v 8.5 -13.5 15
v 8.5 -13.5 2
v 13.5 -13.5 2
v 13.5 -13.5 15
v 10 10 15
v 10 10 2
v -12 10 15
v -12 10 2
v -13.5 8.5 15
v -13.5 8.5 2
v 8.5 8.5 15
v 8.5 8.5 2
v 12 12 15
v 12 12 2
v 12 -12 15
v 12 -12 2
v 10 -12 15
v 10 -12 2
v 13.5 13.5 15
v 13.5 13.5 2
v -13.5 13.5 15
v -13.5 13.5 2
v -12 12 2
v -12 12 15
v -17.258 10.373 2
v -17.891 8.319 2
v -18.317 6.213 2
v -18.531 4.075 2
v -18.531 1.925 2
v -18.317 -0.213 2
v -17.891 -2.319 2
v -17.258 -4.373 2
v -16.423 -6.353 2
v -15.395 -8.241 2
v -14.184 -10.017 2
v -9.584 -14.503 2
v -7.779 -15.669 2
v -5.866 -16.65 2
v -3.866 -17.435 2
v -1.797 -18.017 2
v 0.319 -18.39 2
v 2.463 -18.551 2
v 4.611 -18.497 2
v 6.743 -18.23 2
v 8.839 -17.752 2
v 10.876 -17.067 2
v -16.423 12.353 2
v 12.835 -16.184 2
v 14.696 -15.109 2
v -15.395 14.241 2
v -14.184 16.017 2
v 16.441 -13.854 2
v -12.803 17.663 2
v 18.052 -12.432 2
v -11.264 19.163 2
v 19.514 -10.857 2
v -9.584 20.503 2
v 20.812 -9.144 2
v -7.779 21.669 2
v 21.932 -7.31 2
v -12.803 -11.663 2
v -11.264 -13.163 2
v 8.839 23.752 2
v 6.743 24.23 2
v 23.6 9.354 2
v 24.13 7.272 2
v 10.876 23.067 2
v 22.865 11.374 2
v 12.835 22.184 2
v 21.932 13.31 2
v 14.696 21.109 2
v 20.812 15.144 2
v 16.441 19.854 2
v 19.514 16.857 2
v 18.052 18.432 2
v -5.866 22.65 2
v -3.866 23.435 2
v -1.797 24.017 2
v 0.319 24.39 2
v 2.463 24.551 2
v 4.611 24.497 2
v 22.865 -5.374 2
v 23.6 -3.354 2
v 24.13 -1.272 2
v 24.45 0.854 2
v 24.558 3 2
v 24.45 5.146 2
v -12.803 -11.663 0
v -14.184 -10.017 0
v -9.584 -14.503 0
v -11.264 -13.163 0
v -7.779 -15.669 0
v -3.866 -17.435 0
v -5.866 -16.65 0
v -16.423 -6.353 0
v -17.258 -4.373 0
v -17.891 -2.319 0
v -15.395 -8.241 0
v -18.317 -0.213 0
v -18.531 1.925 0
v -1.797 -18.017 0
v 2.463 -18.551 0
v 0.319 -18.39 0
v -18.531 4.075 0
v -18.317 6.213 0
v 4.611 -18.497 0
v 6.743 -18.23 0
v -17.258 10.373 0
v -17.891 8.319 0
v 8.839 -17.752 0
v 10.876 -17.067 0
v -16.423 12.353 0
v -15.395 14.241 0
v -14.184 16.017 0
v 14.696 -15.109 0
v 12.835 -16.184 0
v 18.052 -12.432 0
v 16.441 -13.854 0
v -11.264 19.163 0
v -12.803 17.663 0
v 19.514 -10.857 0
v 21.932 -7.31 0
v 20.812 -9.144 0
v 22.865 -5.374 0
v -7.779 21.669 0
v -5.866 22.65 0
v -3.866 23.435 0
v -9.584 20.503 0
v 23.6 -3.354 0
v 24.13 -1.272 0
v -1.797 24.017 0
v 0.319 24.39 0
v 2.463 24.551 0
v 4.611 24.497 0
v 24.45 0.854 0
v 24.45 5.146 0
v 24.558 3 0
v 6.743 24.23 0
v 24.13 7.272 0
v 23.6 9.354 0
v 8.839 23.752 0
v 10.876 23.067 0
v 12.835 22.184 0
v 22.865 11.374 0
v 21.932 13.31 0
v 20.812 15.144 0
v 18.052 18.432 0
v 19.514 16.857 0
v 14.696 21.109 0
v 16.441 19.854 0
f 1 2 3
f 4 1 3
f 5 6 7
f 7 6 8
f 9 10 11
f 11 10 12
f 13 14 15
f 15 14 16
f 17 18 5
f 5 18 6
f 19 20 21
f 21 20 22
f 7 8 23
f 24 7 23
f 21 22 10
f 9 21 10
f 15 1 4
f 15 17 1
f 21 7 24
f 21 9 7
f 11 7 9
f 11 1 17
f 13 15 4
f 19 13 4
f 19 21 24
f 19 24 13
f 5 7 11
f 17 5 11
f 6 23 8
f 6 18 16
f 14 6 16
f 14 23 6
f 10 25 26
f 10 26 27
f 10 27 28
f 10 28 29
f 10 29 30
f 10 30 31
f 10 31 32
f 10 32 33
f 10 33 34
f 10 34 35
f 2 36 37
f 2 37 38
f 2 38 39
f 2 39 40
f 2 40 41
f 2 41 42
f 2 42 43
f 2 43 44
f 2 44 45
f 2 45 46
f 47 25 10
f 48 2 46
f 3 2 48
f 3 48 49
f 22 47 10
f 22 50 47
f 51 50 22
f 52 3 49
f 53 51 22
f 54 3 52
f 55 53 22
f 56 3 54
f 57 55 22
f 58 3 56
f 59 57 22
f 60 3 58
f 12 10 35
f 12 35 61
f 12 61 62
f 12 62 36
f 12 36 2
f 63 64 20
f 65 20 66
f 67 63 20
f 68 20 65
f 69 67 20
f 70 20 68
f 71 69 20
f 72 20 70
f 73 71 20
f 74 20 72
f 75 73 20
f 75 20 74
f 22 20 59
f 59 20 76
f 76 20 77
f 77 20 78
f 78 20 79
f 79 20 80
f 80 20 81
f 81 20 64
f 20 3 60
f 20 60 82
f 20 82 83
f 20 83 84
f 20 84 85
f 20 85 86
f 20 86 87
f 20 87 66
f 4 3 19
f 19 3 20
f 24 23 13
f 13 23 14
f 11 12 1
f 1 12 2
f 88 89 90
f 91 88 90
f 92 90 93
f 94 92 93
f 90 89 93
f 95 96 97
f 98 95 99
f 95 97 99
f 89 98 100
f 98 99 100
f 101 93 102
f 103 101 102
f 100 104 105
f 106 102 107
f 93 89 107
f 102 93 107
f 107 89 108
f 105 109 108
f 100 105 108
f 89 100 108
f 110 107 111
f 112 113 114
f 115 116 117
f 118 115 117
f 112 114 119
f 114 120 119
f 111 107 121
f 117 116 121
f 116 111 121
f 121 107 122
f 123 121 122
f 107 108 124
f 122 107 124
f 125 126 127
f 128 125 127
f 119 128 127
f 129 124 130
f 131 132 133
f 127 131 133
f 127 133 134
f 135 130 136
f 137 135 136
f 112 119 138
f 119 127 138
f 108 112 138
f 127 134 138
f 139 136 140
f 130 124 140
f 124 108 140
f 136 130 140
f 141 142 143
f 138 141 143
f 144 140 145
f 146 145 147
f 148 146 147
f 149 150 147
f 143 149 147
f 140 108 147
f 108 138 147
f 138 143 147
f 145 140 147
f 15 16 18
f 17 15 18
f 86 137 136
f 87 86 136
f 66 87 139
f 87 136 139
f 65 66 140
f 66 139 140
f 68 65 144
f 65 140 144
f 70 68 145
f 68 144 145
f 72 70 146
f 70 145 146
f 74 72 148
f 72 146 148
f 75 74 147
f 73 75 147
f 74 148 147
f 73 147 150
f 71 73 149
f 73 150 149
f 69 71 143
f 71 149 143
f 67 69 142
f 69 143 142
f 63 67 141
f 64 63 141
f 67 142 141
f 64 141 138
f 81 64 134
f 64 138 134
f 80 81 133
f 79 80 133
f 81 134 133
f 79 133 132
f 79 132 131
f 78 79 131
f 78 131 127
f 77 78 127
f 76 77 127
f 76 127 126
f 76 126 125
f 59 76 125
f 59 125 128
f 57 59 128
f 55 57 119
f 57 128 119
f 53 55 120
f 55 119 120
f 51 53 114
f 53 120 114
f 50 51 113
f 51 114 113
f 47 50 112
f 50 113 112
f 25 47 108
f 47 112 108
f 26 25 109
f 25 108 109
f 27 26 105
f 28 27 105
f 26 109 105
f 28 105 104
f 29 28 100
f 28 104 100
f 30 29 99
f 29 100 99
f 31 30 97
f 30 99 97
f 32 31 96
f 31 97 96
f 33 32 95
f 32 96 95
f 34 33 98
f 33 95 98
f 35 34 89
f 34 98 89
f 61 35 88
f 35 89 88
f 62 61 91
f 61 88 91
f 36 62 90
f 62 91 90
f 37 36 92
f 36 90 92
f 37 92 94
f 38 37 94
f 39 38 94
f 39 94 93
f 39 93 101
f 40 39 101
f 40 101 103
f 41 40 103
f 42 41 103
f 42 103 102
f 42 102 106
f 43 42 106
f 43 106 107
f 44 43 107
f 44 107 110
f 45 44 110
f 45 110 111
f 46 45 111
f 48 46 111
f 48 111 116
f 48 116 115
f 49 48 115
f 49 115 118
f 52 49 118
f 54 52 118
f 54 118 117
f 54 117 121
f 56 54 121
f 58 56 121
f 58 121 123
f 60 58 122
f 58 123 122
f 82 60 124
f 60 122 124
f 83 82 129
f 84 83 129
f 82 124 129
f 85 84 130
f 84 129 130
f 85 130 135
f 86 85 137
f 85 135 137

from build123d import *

# Parameters (mm, degrees)
F0_R     = 21.5576072156
F1_DEPTH = 2
F2_DEPTH = 15


with BuildPart() as f1:
    # F0 (on Top) → F1 (new body)
    with BuildSketch(Plane.XY):
        with Locations((3, 3)):
            Circle(F0_R)
        Polygon((-13.5, 13.5), (13.5, 13.5), (13.5, -13.5), (8.5, -13.5), (8.5, -8.5), (8.5, 8.5), (-8.5, 8.5), (-13.5, 8.5), align=None, mode=Mode.SUBTRACT)
        Polygon((13.5, -13.5), (13.5, 13.5), (-13.5, 13.5), (-13.5, 8.5), (-8.5, 8.5), (8.5, 8.5), (8.5, -8.5), (8.5, -13.5), align=None)
        Polygon((-12, 10), (-12, 12), (12, 12), (12, -12), (10, -12), (10, -10), (10, 10), (-10, 10), align=None, mode=Mode.SUBTRACT)
        Polygon((12, 12), (-12, 12), (-12, 10), (-10, 10), (10, 10), (10, -10), (10, -12), (12, -12), align=None)
    extrude(amount=F1_DEPTH)

    # F0 (on Top) → F2 (join)
    with BuildSketch(Plane.XY):
        Polygon((13.5, -13.5), (13.5, 13.5), (-13.5, 13.5), (-13.5, 8.5), (-8.5, 8.5), (8.5, 8.5), (8.5, -8.5), (8.5, -13.5), align=None)
        Polygon((-12, 10), (-12, 12), (12, 12), (12, -12), (10, -12), (10, -10), (10, 10), (-10, 10), align=None, mode=Mode.SUBTRACT)
    extrude(amount=F2_DEPTH)


solid = f1.part
